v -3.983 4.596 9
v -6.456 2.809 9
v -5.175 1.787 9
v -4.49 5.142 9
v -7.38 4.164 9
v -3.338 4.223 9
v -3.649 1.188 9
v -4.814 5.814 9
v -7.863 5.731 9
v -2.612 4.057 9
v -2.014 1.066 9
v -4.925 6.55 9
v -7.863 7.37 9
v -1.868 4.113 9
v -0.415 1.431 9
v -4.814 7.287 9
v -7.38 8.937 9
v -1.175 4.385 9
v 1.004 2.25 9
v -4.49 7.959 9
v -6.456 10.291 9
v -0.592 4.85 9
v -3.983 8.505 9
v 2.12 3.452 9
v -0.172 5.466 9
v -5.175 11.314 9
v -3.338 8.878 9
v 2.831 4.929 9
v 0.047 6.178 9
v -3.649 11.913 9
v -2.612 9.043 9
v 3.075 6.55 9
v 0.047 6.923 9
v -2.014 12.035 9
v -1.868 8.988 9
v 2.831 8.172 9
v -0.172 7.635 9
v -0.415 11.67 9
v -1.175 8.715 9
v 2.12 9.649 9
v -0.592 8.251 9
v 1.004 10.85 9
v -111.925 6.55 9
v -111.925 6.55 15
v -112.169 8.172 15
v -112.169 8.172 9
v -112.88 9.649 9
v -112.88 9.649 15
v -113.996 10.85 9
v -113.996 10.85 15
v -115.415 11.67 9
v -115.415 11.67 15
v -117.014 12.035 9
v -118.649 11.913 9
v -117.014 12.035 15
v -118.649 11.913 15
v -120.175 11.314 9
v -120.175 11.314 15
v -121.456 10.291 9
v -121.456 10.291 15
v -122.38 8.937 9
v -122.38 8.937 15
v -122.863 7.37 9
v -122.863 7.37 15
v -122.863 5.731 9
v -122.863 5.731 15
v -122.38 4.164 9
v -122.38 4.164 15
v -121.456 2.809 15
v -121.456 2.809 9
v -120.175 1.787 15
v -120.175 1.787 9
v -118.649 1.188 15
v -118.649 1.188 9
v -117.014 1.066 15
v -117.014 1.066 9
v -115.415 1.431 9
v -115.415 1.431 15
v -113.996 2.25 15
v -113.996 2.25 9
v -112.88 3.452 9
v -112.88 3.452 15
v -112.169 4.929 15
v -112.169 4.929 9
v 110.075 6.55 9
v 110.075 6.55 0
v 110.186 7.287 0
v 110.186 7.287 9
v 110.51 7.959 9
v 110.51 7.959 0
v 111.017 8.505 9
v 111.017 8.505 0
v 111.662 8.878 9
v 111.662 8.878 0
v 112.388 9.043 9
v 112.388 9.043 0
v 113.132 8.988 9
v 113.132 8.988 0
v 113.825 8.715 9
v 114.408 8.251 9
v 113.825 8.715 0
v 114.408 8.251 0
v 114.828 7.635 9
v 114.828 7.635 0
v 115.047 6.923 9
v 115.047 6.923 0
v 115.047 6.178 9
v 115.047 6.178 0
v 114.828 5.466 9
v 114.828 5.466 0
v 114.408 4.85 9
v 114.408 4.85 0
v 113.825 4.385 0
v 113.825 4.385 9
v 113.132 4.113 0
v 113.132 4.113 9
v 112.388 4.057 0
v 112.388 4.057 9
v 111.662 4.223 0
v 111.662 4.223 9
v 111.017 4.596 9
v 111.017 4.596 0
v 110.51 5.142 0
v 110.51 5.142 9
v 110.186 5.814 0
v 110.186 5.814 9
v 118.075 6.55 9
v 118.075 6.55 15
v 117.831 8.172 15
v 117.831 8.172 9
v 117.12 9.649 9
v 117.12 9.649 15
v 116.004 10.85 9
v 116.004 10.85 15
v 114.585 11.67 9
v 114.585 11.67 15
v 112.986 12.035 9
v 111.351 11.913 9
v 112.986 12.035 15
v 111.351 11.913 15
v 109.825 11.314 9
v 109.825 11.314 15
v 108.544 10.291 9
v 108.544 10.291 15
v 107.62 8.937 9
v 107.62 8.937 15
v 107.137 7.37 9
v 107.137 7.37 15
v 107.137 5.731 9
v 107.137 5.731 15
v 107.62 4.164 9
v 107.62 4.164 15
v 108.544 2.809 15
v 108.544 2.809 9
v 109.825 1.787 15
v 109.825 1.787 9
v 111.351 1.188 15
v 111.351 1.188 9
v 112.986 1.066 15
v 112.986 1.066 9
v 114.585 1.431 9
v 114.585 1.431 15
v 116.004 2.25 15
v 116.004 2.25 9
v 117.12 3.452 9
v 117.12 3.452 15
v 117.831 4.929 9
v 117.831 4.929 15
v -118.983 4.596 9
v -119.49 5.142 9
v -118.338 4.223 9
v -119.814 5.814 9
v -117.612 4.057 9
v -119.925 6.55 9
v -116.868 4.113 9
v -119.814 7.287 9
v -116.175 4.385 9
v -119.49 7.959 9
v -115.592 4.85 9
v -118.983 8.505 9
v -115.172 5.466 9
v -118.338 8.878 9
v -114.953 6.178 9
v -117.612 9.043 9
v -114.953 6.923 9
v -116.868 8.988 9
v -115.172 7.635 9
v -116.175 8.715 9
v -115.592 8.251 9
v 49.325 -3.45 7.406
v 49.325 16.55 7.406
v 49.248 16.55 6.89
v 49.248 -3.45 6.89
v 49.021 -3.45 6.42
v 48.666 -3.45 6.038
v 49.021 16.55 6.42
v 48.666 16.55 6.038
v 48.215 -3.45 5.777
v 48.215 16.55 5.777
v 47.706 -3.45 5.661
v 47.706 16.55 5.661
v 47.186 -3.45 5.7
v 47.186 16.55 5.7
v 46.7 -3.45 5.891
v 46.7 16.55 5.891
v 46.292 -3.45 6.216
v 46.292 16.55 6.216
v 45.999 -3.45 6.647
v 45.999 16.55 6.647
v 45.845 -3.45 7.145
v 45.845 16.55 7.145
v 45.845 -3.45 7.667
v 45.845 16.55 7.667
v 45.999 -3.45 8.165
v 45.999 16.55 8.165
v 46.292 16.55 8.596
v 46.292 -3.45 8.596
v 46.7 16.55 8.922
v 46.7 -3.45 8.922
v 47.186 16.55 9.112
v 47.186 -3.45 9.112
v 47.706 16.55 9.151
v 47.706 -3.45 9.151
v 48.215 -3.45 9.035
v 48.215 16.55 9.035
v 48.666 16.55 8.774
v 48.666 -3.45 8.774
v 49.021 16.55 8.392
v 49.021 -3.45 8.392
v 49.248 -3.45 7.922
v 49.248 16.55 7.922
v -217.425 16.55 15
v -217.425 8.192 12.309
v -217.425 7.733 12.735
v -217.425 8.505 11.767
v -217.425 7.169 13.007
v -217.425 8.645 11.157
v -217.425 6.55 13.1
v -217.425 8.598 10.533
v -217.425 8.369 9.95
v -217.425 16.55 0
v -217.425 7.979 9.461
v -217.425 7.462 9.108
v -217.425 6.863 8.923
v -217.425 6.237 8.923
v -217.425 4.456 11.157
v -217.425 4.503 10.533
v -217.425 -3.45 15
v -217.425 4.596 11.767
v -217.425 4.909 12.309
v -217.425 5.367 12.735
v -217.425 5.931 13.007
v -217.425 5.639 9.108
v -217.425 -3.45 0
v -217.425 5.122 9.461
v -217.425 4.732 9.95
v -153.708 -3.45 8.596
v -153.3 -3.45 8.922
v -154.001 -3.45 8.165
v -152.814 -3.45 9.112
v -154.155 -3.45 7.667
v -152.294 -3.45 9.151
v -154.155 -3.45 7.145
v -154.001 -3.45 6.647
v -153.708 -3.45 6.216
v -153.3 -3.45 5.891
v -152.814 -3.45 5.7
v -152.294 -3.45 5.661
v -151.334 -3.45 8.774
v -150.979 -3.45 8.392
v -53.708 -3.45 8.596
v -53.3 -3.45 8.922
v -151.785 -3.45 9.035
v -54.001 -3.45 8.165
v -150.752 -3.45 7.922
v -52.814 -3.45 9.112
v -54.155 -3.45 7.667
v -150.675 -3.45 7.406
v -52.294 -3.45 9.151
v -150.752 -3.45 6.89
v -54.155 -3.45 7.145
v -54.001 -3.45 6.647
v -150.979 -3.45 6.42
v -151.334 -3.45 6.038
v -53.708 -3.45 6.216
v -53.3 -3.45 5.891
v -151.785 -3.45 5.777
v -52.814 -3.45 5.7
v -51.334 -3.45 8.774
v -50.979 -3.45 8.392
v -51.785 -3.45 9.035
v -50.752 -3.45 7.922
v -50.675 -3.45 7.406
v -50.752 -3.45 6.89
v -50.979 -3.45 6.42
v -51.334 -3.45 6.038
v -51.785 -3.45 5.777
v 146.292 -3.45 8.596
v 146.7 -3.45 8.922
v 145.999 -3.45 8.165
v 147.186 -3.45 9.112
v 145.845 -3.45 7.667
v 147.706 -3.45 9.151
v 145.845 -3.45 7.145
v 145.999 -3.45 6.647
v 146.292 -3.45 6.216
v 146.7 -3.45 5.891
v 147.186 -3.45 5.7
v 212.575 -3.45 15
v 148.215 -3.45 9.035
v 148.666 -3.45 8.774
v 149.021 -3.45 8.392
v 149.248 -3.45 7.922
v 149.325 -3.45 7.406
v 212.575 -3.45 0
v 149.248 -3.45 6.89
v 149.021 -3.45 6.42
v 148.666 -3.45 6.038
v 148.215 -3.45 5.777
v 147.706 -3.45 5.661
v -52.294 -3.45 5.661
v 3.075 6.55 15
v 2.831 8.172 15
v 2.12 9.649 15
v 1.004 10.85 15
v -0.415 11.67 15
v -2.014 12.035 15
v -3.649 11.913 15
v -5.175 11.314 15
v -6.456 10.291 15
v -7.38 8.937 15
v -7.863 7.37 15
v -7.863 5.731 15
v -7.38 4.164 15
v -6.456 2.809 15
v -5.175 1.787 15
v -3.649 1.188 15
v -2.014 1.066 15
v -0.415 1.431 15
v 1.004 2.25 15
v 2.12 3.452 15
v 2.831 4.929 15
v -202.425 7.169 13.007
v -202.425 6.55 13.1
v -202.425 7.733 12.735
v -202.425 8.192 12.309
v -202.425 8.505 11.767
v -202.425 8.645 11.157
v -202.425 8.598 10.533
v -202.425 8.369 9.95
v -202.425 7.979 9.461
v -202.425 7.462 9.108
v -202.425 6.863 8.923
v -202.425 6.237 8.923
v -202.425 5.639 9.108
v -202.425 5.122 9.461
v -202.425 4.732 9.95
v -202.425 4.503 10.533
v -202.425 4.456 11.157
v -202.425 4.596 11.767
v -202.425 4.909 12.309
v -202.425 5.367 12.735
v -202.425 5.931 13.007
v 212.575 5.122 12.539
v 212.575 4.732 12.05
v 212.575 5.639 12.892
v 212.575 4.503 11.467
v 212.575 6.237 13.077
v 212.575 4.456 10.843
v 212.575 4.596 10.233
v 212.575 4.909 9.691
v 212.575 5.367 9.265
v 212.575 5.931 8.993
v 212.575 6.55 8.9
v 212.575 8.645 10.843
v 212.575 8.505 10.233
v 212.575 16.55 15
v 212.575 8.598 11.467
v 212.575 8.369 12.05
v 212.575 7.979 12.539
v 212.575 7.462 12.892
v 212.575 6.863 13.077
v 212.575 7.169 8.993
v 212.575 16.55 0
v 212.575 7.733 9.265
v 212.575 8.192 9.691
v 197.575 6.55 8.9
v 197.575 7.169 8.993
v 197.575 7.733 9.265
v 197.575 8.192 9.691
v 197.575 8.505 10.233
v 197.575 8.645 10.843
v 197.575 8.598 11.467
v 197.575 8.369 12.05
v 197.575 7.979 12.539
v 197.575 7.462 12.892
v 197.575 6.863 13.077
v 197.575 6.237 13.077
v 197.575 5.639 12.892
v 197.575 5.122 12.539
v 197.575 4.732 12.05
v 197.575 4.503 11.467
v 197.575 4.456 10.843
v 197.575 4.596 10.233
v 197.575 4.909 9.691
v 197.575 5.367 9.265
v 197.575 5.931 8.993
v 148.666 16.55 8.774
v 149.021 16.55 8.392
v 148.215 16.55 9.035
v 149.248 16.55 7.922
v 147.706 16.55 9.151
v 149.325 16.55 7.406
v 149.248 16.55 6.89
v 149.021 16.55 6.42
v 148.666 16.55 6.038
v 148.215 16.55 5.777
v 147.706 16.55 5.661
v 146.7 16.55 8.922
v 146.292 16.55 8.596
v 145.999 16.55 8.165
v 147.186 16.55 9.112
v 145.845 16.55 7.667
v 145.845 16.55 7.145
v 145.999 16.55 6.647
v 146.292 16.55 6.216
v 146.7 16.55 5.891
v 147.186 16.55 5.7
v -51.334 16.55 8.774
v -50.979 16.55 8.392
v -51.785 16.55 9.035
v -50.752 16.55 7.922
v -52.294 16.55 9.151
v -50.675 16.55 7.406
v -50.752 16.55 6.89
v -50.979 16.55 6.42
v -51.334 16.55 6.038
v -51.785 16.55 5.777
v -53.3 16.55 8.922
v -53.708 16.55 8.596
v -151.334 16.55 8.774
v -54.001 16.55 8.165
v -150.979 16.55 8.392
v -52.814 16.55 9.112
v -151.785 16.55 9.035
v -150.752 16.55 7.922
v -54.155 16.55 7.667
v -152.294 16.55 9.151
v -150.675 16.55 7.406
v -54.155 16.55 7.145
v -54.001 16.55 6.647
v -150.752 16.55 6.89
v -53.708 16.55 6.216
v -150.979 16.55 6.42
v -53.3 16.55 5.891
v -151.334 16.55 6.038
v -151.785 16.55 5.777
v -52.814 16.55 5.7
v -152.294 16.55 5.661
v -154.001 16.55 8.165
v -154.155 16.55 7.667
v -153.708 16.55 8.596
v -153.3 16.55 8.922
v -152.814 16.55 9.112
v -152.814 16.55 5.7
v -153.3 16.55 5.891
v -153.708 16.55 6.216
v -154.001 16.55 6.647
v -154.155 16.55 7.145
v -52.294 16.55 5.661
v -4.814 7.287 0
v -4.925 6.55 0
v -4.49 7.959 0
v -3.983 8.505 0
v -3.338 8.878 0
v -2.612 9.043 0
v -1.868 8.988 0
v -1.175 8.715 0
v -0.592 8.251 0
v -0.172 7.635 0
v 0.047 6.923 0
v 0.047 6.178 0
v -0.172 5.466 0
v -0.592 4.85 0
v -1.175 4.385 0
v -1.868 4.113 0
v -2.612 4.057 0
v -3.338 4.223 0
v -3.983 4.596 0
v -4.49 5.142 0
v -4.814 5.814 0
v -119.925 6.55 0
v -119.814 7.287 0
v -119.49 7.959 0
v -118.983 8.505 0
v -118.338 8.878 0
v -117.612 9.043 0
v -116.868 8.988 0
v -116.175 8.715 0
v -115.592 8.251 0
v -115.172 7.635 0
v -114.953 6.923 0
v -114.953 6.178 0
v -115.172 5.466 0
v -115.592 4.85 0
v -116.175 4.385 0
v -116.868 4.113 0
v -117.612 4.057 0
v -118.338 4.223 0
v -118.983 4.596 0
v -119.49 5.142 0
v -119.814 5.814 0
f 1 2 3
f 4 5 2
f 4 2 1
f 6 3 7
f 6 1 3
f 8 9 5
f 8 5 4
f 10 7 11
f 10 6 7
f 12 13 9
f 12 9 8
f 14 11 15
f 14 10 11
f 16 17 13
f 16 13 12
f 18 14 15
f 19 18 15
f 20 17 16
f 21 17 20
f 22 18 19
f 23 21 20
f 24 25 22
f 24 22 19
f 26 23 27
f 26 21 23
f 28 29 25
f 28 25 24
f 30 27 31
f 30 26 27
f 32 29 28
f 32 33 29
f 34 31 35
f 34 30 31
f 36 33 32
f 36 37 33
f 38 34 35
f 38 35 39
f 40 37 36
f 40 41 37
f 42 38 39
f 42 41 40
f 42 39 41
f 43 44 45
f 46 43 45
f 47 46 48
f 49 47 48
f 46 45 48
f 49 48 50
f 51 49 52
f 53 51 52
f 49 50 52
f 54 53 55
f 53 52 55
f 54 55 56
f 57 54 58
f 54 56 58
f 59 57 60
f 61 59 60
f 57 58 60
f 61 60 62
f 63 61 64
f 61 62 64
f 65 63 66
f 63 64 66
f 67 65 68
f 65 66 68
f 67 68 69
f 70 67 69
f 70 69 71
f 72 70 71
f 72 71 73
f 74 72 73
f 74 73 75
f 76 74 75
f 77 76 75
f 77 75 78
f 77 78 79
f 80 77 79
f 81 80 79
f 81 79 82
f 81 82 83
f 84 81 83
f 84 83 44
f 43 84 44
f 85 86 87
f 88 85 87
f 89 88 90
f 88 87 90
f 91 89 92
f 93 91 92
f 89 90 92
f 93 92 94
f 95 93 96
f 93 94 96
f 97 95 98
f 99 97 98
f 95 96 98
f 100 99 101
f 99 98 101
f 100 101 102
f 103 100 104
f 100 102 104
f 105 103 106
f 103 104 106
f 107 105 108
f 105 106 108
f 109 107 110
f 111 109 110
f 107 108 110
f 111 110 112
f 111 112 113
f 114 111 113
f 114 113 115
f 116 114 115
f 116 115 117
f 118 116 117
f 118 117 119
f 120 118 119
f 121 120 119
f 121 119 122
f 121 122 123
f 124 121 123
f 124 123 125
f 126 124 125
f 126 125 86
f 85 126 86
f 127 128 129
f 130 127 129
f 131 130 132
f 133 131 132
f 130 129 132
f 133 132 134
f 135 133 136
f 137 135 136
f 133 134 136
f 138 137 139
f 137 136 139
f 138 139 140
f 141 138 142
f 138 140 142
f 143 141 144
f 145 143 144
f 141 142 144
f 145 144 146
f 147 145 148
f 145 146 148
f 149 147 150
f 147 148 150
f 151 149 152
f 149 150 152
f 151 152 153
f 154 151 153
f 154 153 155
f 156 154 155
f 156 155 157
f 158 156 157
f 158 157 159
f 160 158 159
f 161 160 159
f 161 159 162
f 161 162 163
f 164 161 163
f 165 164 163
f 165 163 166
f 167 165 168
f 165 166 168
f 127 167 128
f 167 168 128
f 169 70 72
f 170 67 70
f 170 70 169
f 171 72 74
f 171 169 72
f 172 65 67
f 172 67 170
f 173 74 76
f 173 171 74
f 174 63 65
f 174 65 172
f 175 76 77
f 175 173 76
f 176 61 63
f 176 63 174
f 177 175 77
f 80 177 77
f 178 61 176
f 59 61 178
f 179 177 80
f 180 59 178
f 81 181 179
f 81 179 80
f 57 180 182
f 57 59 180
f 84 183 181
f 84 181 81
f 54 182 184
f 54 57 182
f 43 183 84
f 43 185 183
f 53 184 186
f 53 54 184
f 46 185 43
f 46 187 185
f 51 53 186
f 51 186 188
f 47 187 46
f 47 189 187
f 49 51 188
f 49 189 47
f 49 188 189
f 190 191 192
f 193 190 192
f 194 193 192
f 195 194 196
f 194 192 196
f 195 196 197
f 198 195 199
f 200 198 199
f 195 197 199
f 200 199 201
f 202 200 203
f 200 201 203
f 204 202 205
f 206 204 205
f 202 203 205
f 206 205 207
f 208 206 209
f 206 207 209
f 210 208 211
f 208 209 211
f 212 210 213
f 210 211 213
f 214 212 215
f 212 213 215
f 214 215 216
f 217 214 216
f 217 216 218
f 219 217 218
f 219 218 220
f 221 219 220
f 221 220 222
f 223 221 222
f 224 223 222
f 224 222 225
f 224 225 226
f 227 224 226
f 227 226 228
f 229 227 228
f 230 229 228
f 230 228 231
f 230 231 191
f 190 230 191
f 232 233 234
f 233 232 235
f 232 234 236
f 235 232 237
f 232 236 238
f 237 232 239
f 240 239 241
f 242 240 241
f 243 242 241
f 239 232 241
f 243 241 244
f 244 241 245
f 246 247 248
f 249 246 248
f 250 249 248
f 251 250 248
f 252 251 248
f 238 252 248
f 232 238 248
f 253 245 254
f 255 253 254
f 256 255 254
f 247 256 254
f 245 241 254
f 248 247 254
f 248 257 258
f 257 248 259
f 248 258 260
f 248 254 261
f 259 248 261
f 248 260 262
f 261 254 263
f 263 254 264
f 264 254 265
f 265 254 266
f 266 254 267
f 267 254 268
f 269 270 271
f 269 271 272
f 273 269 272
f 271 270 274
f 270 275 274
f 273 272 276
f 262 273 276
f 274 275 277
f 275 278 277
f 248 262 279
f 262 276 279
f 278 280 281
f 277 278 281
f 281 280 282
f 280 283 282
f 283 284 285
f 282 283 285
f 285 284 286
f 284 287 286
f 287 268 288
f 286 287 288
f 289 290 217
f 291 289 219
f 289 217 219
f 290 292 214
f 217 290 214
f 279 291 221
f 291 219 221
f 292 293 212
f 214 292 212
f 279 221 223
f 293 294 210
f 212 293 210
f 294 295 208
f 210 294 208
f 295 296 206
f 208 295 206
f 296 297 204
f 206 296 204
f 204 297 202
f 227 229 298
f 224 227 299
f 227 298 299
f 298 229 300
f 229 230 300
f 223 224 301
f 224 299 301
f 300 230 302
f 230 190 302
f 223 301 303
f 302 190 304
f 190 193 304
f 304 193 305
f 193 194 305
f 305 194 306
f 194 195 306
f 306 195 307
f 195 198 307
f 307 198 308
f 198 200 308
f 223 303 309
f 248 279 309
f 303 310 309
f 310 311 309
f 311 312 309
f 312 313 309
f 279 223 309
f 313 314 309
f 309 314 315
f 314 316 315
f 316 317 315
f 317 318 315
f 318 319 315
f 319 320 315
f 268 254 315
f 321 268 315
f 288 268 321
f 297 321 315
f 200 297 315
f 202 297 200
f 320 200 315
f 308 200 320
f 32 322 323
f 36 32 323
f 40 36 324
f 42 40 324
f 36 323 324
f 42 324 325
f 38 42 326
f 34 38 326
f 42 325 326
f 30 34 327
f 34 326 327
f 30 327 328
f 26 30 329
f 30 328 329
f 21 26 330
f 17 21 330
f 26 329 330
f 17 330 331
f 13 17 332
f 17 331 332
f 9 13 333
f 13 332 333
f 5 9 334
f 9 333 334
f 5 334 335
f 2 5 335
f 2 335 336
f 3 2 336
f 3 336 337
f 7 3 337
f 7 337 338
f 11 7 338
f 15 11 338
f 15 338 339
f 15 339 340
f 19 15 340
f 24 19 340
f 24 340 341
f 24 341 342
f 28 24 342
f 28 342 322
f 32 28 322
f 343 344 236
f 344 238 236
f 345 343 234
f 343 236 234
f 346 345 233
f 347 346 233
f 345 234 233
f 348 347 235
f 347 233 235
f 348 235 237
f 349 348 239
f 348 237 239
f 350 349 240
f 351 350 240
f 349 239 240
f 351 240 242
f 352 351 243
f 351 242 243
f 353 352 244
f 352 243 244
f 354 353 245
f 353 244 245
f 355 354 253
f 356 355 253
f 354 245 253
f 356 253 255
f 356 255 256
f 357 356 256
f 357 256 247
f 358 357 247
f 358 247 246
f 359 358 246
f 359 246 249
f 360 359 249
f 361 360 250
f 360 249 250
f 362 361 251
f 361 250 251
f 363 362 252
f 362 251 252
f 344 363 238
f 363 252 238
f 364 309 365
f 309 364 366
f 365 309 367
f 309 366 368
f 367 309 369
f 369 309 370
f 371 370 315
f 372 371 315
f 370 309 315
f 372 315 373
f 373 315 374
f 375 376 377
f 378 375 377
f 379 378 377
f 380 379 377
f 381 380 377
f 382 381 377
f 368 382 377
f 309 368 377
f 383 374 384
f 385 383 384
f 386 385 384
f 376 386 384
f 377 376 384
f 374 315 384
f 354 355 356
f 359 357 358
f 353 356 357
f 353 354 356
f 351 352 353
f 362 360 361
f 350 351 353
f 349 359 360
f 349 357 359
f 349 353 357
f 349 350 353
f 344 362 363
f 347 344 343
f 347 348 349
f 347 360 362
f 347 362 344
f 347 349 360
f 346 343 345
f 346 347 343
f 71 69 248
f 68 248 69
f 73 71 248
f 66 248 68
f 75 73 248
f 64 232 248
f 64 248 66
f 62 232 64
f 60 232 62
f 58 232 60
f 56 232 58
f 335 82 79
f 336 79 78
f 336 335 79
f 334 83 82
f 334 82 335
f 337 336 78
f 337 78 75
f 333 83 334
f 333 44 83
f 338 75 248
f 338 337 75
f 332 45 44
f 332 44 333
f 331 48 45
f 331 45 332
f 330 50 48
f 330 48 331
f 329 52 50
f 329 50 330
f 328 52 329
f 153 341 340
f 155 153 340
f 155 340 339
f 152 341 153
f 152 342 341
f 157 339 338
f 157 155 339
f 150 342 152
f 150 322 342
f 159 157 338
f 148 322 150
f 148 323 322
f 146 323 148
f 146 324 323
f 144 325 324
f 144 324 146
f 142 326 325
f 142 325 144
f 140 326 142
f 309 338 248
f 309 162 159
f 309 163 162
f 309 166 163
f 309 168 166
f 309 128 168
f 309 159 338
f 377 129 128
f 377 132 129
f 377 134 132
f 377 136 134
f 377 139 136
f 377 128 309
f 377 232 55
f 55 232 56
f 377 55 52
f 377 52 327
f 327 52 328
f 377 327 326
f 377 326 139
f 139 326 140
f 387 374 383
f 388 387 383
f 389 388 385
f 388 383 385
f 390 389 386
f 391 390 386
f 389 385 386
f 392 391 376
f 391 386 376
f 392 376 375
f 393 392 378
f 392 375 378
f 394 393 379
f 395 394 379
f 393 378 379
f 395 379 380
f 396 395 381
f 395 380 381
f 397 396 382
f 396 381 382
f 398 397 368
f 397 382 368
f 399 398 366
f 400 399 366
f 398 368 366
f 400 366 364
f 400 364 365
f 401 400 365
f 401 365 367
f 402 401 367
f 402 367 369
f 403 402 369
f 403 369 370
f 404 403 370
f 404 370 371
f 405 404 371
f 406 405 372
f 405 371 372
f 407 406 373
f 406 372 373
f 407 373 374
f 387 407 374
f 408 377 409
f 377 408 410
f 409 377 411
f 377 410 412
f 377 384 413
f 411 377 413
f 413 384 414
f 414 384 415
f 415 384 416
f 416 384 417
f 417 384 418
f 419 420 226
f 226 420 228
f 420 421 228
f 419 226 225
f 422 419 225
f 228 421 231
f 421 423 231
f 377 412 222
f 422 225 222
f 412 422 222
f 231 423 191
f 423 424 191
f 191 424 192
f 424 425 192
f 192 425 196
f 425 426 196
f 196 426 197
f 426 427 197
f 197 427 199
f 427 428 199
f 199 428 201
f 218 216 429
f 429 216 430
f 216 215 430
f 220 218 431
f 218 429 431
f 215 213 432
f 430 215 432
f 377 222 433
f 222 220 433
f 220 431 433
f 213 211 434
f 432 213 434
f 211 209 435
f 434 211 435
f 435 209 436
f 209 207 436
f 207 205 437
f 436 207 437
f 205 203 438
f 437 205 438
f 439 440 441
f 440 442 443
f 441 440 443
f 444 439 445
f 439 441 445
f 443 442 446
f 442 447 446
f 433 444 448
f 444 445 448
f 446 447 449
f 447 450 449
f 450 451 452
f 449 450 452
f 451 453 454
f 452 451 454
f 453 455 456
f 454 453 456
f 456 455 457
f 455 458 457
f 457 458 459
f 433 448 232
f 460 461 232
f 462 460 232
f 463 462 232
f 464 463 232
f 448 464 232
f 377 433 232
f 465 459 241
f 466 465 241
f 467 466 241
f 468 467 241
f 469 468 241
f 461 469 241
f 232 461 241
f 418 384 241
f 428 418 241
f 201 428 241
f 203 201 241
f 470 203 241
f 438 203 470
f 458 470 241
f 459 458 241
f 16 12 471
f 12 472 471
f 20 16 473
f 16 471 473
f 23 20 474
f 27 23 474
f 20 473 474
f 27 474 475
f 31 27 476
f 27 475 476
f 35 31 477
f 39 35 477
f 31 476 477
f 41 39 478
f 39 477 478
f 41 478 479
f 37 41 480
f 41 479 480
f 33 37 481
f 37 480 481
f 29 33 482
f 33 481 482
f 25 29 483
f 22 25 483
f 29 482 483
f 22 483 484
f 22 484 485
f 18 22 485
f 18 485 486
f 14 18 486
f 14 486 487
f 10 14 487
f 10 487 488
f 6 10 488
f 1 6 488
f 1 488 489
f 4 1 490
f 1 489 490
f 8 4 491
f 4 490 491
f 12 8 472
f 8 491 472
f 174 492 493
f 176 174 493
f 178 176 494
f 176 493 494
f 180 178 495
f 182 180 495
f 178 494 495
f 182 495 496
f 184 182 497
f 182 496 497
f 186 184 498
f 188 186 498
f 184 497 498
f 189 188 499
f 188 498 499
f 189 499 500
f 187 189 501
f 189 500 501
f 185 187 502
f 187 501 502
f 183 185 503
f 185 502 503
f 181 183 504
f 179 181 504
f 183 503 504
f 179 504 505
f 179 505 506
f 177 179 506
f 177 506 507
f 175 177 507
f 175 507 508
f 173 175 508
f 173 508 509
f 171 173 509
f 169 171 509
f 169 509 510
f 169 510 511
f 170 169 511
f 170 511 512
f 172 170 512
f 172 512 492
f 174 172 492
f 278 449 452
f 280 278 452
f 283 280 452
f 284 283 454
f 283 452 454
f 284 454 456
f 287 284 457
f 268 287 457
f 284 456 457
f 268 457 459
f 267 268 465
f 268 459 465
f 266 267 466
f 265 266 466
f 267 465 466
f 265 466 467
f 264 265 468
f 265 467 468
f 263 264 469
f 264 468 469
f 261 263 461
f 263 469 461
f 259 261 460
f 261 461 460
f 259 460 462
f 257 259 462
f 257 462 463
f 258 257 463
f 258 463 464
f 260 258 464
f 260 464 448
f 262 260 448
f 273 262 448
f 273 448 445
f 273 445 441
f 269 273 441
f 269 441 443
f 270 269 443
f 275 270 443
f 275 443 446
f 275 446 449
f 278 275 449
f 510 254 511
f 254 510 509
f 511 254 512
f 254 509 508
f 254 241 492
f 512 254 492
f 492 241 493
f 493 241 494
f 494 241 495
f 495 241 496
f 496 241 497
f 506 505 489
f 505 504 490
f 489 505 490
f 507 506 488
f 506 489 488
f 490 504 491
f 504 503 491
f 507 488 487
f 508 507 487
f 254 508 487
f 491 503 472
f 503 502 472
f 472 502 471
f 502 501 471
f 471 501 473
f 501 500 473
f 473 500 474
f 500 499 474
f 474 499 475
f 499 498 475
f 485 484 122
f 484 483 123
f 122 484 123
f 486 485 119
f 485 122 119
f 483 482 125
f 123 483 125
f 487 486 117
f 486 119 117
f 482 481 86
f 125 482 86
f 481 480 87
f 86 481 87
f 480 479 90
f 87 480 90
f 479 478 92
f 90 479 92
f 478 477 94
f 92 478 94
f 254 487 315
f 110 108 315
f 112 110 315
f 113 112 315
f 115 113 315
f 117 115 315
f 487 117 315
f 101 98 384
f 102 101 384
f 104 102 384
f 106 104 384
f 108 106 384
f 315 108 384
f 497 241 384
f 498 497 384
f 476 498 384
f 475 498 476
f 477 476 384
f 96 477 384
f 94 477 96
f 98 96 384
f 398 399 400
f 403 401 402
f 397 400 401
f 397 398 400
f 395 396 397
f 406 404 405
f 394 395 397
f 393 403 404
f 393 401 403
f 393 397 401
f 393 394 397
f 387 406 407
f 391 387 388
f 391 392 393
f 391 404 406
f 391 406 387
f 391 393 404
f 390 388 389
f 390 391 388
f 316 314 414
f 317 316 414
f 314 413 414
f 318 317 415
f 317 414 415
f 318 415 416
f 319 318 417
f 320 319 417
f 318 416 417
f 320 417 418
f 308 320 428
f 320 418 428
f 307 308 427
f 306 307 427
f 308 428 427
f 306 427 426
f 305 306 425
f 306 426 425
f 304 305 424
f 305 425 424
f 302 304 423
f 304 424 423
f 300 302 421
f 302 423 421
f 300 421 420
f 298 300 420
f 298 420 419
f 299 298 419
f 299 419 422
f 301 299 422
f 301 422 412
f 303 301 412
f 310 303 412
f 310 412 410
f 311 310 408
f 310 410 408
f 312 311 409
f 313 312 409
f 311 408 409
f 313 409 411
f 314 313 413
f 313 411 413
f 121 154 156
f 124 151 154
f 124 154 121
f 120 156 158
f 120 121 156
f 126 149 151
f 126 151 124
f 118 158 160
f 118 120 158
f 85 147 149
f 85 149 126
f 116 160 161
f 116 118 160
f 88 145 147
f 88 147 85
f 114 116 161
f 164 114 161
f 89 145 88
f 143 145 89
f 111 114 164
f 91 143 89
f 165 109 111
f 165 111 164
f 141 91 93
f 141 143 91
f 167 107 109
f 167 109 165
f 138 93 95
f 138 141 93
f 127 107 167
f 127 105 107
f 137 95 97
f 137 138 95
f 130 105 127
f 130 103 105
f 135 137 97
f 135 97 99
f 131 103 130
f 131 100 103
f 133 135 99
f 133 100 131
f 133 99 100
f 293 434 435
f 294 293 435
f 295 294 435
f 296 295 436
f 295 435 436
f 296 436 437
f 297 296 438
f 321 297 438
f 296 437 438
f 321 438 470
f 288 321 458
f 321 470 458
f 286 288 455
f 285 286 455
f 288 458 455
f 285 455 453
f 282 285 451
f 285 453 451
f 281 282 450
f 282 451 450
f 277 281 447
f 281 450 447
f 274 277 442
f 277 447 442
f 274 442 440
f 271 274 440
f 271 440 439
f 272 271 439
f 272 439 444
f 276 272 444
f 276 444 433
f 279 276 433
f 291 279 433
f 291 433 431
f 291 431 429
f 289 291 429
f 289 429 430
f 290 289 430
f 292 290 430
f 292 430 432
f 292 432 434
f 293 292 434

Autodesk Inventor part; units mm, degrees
ref_plane "YZ Plane" through (0, 0, 0) normal (1, 0, 0) x (0, 1, 0)
ref_plane "XZ Plane" through (0, 0, 0) normal (0, 1, 0) x (-1, 0, 0)
ref_plane "XY Plane" through (0, 0, 0) normal (0, 0, 1) x (1, 0, 0)
sketch "Sketch1" plane through (0, 0, 0) normal (0, 0, 1) x (1, 0, 0)
  line L0 (-212.4247, -46.9955) -> (-212.4247, -61.9955) projected
  line L1 (-212.4247, -61.9955) -> (213.9753, -61.9955) projected
  line L2 (213.9753, -61.9955) -> (213.9753, -46.9955) projected
  line L3 (213.9753, -46.9955) -> (-212.4247, -46.9955) projected
  line L4 (213.9754, 278.5874) -> (243.9754, 278.5874) projected
  line L5 (243.9754, 278.5874) -> (243.9753, -71.9955) projected
  line L6 (243.9753, -71.9955) -> (-242.4247, -71.9955) projected
  line L7 (-242.4247, -71.9955) -> (-242.4246, 278.5875) projected
  line L8 (-242.4246, 278.5875) -> (-212.4246, 278.5875) projected
  line L9 (-212.4246, 278.5875) -> (-212.4247, -21.9955) projected
  line L10 (-212.4247, -21.9955) -> (213.9753, -21.9955) projected
  line L11 (213.9753, -21.9955) -> (213.9754, 278.5874) projected
  line L12 (-217.4247, -3.4496) -> (212.5753, -3.4496)
  line L13 (212.5753, -3.4496) -> (212.5753, 16.5504)
  line L14 (212.5753, 16.5504) -> (-217.4247, 16.5504)
  line L15 (-217.4247, 16.5504) -> (-217.4247, -3.4496)
  point P0 (0, 0)
  dimension "d1" = 20
  dimension "d11" = 430
extrude "Extrusion1" add sketch "Sketch1" along normal blind 15 contours L12 L15 L14 L9 | L9 L14 L13 L12
sketch "Sketch2" plane through (0, 0, 0) normal (0, 0, -1) x (-1, 0, 0)
  line L0 (217.4247, -3.4496) -> (-212.5753, -3.4496) construction
  line L1 (2.4247, -3.4496) -> (2.4247, 18.0985) construction
  line L2 (217.4247, 16.5504) -> (217.4247, -3.4496) construction
  line L3 (217.4247, 6.5504) -> (-212.5753, 6.5504) construction
  line L4 (-212.5753, -3.4496) -> (-212.5753, 16.5504) construction
  circle A0 centre (117.4247, 6.5504) radius 2.5
  circle A1 centre (-112.5753, 6.5504) radius 2.5
  circle A2 centre (2.4247, 6.5504) radius 2.5
  point P0 (0, 0)
  dimension "d4" = 5
  dimension "d5" = 100
  dimension "d6" = 5
  dimension "d7" = 100
  dimension "d8" = 5
extrude "Extrusion2" cut sketch "Sketch2" against normal through all
sketch "Sketch3" plane through (0, 0, 15) normal (0, 0, 1) x (1, 0, 0)
  circle A0 centre (-117.4247, 6.5504) radius 2.5 projected
  circle A1 centre (-2.4247, 6.5504) radius 2.5 projected
  circle A2 centre (112.5753, 6.5504) radius 2.5 projected
  circle A3 centre (-117.4247, 6.5504) radius 5.5
  circle A4 centre (-2.4247, 6.5504) radius 5.5
  circle A5 centre (112.5753, 6.5504) radius 5.5
  point P0 (0, 0)
  dimension "d12" = 11
  dimension "d13" = 11
  dimension "d14" = 11
extrude "Extrusion3" cut sketch "Sketch3" against normal blind 6 contours A0 | A1 | A2 | A3 | A4 | A5
sketch "Sketch4" plane through (212.5753, -3.4496, 0) normal (1, 0, 0) x (0, 0, -1)
  circle A0 centre (-11, 10) radius 2.1
  line L0 (-15, 0) -> (-15, 20) projected
  point P0 (0, 3.4496)
  dimension "d17" = 4.2
  dimension "d18" = 4
extrude "Extrusion4" cut sketch "Sketch4" against normal blind 15
sketch "Sketch5" plane through (-217.4247, -3.4496, 0) normal (-1, 0, 0) x (0, 0, 1)
  circle A0 centre (11, 10) radius 2.1 projected
  circle A1 centre (11, 10) radius 2.1 projected
  point P0 (0, 3.4496)
extrude "Extrusion5" cut sketch "Sketch5" against normal blind 15
sketch "Sketch6" plane through (-217.4247, 16.5504, 0) normal (0, 1, 0) x (1, 0, 0)
  circle A0 centre (65, -7.4061) radius 1.75
  line L0 (430, 0) -> (0, 0) construction
  circle A1 centre (165, -7.4061) radius 1.75
  circle A2 centre (265, -7.4061) radius 1.75
  circle A3 centre (365, -7.4061) radius 1.75
  line L1 (0, 0) -> (0, -15) construction
  point P0 (217.4247, 0)
  dimension "d23" = 3.5
  dimension "d26" = 100
  dimension "d31" = 65
extrude "Extrusion6" cut sketch "Sketch6" against normal through all
properties part number "Wiper Springloaded 1_CPY"
